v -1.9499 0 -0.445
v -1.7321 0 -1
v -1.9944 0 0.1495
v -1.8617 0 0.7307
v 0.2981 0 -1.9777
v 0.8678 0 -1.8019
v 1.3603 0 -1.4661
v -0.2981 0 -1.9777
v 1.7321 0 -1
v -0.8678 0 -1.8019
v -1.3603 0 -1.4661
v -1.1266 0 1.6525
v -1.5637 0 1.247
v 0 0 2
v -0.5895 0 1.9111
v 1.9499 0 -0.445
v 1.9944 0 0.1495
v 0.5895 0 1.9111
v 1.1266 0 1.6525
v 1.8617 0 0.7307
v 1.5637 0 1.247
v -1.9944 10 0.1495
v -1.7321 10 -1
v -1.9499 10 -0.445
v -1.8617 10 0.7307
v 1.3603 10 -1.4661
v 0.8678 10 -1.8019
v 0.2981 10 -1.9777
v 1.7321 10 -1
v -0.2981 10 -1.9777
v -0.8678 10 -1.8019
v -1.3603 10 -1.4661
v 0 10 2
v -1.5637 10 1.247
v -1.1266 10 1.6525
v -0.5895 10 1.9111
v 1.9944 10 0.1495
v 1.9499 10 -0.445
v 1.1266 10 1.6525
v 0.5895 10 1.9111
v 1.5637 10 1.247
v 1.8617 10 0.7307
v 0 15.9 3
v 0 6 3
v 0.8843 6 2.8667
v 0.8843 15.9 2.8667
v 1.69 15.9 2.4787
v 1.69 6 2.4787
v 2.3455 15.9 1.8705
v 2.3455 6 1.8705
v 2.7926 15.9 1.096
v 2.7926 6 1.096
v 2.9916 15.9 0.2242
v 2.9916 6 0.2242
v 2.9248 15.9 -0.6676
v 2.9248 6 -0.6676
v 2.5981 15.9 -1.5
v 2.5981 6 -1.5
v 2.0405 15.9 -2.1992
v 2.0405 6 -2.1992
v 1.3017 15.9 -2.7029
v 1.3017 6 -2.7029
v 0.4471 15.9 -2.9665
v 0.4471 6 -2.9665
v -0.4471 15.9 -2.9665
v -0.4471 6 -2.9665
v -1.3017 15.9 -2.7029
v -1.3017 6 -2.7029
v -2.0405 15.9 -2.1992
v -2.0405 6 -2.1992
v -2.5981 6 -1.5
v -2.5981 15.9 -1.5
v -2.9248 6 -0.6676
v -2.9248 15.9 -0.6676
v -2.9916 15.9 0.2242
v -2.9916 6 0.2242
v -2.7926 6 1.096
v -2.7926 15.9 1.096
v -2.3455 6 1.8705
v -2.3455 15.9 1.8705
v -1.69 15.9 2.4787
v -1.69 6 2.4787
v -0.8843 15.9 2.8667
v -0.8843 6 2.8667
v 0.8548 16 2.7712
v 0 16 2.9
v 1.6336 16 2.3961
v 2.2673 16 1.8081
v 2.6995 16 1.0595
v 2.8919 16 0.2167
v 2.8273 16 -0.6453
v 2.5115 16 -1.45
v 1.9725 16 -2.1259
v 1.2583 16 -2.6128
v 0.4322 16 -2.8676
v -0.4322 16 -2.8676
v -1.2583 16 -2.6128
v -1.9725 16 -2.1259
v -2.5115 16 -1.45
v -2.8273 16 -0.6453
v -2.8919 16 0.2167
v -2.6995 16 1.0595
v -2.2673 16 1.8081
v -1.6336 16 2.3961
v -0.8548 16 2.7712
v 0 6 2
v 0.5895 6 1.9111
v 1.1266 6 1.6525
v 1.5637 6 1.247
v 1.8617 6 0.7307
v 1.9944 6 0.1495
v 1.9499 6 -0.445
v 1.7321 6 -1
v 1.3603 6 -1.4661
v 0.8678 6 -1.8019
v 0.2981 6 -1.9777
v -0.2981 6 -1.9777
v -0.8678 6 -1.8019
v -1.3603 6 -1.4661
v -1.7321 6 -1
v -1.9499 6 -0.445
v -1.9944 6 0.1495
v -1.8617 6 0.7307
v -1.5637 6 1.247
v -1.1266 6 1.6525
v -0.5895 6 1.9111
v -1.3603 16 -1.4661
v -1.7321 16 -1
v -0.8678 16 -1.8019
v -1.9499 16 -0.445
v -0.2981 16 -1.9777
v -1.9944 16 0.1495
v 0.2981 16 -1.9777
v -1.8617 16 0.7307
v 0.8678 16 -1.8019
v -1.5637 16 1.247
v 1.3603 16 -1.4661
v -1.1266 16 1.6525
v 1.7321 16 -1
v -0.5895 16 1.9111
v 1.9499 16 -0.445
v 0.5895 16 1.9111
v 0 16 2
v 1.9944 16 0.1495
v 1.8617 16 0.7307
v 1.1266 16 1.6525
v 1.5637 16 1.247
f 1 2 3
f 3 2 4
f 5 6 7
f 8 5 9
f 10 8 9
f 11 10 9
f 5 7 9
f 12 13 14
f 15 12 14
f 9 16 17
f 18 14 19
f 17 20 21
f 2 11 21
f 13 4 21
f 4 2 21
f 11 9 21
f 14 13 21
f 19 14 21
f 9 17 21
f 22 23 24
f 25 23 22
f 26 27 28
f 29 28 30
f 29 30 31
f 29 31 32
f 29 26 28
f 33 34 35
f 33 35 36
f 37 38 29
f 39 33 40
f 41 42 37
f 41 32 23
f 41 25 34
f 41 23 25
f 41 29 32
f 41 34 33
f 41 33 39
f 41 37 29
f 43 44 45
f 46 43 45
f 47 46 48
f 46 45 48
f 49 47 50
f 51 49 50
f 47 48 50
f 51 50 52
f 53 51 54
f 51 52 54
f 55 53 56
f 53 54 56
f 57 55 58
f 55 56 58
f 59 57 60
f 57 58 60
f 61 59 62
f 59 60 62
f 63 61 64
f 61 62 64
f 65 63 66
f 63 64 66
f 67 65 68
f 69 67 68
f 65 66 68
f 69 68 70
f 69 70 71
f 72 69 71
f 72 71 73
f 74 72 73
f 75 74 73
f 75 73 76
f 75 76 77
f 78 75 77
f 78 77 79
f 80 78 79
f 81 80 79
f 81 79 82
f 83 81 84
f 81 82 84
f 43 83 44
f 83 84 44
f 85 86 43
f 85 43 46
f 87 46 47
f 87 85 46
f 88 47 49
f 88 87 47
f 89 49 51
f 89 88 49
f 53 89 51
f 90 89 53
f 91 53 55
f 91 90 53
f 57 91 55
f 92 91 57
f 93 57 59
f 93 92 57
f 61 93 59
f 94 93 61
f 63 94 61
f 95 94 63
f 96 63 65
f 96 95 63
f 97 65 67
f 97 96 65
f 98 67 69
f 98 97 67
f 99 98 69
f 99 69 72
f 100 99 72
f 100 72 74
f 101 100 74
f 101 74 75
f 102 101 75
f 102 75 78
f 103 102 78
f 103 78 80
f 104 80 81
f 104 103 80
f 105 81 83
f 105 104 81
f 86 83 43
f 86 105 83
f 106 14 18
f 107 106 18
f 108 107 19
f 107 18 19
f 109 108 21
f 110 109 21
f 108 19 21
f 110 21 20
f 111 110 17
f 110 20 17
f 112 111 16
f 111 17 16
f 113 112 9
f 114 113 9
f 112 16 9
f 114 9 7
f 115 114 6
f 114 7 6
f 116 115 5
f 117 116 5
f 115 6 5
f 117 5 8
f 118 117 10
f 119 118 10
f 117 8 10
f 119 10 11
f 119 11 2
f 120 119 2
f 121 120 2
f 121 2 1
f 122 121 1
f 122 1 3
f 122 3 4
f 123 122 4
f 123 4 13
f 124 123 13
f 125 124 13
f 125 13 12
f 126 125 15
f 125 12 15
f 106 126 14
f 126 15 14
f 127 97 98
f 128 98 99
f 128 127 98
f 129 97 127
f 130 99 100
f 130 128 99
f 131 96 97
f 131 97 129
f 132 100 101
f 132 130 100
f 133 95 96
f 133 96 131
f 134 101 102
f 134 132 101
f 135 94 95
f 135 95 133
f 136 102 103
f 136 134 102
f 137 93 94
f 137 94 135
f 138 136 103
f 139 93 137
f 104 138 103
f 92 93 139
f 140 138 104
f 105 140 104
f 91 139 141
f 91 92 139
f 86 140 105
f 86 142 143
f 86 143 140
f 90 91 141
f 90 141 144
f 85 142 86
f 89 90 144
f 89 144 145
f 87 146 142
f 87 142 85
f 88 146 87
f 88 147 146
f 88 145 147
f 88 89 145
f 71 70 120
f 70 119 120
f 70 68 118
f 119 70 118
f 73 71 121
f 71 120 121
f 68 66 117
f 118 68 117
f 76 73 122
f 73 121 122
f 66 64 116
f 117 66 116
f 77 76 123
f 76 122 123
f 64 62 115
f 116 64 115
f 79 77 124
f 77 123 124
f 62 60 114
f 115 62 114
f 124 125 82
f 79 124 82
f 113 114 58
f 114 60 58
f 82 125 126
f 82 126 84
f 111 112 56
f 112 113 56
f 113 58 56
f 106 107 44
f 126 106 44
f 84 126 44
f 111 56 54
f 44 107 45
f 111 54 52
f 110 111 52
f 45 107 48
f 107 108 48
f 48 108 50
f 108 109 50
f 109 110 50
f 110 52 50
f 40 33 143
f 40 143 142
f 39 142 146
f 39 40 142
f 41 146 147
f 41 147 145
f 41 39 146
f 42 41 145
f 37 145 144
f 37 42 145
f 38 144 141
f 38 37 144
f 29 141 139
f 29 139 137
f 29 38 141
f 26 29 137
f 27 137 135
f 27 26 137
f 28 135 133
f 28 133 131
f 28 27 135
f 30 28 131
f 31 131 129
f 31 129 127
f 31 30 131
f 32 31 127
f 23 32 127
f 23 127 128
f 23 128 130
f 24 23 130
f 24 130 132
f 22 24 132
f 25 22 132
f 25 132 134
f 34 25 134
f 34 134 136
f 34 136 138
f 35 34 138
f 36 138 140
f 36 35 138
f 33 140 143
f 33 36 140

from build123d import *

# Parameters (mm, degrees)
SKETCH1_R           = 2
BOSS_EXTRUDE1_DEPTH = 6
SKETCH2_R           = 3
BOSS_EXTRUDE2_DEPTH = 10
CUT_EXTRUDE1_START  = -6
SKETCH3_R           = 2
CUT_EXTRUDE1_DEPTH  = 6
CHAMFER1_SIZE       = 0.1


with BuildPart() as part:
    # Sketch1 → Boss-Extrude1 (new body)
    with BuildSketch(Plane(origin=(0, 0, 0), x_dir=(1, 0, 0), z_dir=(0, 1, 0))):
        with Locations(Location((0, 0, 0), (0, 0, 270))):
            Circle(SKETCH1_R)
    extrude(amount=BOSS_EXTRUDE1_DEPTH)

    # Sketch2 → Boss-Extrude2 (add)
    with BuildSketch(Plane(origin=(0, 6, 0), x_dir=(1, 0, 0), z_dir=(0, 1, 0))):
        with Locations(Location((0, 0, 0), (0, 0, 270))):
            Circle(SKETCH2_R)
    extrude(amount=BOSS_EXTRUDE2_DEPTH)

    # Sketch3 → Cut-Extrude1 (cut)
    with BuildSketch(Plane(origin=(0, 16, 0), x_dir=(1, 0, 0), z_dir=(0, 1, 0)).offset(CUT_EXTRUDE1_START)):
        with Locations(Location((0, 0, 0), (0, 0, 270))):
            Circle(SKETCH3_R)
    extrude(amount=CUT_EXTRUDE1_DEPTH, mode=Mode.SUBTRACT)

    # Chamfer1
    chamfer1_edges = [part.edges().sort_by_distance(p)[0] for p in [
        (0, 16, -3),
    ]]
    chamfer(chamfer1_edges, length=CHAMFER1_SIZE)


solid = part.part
